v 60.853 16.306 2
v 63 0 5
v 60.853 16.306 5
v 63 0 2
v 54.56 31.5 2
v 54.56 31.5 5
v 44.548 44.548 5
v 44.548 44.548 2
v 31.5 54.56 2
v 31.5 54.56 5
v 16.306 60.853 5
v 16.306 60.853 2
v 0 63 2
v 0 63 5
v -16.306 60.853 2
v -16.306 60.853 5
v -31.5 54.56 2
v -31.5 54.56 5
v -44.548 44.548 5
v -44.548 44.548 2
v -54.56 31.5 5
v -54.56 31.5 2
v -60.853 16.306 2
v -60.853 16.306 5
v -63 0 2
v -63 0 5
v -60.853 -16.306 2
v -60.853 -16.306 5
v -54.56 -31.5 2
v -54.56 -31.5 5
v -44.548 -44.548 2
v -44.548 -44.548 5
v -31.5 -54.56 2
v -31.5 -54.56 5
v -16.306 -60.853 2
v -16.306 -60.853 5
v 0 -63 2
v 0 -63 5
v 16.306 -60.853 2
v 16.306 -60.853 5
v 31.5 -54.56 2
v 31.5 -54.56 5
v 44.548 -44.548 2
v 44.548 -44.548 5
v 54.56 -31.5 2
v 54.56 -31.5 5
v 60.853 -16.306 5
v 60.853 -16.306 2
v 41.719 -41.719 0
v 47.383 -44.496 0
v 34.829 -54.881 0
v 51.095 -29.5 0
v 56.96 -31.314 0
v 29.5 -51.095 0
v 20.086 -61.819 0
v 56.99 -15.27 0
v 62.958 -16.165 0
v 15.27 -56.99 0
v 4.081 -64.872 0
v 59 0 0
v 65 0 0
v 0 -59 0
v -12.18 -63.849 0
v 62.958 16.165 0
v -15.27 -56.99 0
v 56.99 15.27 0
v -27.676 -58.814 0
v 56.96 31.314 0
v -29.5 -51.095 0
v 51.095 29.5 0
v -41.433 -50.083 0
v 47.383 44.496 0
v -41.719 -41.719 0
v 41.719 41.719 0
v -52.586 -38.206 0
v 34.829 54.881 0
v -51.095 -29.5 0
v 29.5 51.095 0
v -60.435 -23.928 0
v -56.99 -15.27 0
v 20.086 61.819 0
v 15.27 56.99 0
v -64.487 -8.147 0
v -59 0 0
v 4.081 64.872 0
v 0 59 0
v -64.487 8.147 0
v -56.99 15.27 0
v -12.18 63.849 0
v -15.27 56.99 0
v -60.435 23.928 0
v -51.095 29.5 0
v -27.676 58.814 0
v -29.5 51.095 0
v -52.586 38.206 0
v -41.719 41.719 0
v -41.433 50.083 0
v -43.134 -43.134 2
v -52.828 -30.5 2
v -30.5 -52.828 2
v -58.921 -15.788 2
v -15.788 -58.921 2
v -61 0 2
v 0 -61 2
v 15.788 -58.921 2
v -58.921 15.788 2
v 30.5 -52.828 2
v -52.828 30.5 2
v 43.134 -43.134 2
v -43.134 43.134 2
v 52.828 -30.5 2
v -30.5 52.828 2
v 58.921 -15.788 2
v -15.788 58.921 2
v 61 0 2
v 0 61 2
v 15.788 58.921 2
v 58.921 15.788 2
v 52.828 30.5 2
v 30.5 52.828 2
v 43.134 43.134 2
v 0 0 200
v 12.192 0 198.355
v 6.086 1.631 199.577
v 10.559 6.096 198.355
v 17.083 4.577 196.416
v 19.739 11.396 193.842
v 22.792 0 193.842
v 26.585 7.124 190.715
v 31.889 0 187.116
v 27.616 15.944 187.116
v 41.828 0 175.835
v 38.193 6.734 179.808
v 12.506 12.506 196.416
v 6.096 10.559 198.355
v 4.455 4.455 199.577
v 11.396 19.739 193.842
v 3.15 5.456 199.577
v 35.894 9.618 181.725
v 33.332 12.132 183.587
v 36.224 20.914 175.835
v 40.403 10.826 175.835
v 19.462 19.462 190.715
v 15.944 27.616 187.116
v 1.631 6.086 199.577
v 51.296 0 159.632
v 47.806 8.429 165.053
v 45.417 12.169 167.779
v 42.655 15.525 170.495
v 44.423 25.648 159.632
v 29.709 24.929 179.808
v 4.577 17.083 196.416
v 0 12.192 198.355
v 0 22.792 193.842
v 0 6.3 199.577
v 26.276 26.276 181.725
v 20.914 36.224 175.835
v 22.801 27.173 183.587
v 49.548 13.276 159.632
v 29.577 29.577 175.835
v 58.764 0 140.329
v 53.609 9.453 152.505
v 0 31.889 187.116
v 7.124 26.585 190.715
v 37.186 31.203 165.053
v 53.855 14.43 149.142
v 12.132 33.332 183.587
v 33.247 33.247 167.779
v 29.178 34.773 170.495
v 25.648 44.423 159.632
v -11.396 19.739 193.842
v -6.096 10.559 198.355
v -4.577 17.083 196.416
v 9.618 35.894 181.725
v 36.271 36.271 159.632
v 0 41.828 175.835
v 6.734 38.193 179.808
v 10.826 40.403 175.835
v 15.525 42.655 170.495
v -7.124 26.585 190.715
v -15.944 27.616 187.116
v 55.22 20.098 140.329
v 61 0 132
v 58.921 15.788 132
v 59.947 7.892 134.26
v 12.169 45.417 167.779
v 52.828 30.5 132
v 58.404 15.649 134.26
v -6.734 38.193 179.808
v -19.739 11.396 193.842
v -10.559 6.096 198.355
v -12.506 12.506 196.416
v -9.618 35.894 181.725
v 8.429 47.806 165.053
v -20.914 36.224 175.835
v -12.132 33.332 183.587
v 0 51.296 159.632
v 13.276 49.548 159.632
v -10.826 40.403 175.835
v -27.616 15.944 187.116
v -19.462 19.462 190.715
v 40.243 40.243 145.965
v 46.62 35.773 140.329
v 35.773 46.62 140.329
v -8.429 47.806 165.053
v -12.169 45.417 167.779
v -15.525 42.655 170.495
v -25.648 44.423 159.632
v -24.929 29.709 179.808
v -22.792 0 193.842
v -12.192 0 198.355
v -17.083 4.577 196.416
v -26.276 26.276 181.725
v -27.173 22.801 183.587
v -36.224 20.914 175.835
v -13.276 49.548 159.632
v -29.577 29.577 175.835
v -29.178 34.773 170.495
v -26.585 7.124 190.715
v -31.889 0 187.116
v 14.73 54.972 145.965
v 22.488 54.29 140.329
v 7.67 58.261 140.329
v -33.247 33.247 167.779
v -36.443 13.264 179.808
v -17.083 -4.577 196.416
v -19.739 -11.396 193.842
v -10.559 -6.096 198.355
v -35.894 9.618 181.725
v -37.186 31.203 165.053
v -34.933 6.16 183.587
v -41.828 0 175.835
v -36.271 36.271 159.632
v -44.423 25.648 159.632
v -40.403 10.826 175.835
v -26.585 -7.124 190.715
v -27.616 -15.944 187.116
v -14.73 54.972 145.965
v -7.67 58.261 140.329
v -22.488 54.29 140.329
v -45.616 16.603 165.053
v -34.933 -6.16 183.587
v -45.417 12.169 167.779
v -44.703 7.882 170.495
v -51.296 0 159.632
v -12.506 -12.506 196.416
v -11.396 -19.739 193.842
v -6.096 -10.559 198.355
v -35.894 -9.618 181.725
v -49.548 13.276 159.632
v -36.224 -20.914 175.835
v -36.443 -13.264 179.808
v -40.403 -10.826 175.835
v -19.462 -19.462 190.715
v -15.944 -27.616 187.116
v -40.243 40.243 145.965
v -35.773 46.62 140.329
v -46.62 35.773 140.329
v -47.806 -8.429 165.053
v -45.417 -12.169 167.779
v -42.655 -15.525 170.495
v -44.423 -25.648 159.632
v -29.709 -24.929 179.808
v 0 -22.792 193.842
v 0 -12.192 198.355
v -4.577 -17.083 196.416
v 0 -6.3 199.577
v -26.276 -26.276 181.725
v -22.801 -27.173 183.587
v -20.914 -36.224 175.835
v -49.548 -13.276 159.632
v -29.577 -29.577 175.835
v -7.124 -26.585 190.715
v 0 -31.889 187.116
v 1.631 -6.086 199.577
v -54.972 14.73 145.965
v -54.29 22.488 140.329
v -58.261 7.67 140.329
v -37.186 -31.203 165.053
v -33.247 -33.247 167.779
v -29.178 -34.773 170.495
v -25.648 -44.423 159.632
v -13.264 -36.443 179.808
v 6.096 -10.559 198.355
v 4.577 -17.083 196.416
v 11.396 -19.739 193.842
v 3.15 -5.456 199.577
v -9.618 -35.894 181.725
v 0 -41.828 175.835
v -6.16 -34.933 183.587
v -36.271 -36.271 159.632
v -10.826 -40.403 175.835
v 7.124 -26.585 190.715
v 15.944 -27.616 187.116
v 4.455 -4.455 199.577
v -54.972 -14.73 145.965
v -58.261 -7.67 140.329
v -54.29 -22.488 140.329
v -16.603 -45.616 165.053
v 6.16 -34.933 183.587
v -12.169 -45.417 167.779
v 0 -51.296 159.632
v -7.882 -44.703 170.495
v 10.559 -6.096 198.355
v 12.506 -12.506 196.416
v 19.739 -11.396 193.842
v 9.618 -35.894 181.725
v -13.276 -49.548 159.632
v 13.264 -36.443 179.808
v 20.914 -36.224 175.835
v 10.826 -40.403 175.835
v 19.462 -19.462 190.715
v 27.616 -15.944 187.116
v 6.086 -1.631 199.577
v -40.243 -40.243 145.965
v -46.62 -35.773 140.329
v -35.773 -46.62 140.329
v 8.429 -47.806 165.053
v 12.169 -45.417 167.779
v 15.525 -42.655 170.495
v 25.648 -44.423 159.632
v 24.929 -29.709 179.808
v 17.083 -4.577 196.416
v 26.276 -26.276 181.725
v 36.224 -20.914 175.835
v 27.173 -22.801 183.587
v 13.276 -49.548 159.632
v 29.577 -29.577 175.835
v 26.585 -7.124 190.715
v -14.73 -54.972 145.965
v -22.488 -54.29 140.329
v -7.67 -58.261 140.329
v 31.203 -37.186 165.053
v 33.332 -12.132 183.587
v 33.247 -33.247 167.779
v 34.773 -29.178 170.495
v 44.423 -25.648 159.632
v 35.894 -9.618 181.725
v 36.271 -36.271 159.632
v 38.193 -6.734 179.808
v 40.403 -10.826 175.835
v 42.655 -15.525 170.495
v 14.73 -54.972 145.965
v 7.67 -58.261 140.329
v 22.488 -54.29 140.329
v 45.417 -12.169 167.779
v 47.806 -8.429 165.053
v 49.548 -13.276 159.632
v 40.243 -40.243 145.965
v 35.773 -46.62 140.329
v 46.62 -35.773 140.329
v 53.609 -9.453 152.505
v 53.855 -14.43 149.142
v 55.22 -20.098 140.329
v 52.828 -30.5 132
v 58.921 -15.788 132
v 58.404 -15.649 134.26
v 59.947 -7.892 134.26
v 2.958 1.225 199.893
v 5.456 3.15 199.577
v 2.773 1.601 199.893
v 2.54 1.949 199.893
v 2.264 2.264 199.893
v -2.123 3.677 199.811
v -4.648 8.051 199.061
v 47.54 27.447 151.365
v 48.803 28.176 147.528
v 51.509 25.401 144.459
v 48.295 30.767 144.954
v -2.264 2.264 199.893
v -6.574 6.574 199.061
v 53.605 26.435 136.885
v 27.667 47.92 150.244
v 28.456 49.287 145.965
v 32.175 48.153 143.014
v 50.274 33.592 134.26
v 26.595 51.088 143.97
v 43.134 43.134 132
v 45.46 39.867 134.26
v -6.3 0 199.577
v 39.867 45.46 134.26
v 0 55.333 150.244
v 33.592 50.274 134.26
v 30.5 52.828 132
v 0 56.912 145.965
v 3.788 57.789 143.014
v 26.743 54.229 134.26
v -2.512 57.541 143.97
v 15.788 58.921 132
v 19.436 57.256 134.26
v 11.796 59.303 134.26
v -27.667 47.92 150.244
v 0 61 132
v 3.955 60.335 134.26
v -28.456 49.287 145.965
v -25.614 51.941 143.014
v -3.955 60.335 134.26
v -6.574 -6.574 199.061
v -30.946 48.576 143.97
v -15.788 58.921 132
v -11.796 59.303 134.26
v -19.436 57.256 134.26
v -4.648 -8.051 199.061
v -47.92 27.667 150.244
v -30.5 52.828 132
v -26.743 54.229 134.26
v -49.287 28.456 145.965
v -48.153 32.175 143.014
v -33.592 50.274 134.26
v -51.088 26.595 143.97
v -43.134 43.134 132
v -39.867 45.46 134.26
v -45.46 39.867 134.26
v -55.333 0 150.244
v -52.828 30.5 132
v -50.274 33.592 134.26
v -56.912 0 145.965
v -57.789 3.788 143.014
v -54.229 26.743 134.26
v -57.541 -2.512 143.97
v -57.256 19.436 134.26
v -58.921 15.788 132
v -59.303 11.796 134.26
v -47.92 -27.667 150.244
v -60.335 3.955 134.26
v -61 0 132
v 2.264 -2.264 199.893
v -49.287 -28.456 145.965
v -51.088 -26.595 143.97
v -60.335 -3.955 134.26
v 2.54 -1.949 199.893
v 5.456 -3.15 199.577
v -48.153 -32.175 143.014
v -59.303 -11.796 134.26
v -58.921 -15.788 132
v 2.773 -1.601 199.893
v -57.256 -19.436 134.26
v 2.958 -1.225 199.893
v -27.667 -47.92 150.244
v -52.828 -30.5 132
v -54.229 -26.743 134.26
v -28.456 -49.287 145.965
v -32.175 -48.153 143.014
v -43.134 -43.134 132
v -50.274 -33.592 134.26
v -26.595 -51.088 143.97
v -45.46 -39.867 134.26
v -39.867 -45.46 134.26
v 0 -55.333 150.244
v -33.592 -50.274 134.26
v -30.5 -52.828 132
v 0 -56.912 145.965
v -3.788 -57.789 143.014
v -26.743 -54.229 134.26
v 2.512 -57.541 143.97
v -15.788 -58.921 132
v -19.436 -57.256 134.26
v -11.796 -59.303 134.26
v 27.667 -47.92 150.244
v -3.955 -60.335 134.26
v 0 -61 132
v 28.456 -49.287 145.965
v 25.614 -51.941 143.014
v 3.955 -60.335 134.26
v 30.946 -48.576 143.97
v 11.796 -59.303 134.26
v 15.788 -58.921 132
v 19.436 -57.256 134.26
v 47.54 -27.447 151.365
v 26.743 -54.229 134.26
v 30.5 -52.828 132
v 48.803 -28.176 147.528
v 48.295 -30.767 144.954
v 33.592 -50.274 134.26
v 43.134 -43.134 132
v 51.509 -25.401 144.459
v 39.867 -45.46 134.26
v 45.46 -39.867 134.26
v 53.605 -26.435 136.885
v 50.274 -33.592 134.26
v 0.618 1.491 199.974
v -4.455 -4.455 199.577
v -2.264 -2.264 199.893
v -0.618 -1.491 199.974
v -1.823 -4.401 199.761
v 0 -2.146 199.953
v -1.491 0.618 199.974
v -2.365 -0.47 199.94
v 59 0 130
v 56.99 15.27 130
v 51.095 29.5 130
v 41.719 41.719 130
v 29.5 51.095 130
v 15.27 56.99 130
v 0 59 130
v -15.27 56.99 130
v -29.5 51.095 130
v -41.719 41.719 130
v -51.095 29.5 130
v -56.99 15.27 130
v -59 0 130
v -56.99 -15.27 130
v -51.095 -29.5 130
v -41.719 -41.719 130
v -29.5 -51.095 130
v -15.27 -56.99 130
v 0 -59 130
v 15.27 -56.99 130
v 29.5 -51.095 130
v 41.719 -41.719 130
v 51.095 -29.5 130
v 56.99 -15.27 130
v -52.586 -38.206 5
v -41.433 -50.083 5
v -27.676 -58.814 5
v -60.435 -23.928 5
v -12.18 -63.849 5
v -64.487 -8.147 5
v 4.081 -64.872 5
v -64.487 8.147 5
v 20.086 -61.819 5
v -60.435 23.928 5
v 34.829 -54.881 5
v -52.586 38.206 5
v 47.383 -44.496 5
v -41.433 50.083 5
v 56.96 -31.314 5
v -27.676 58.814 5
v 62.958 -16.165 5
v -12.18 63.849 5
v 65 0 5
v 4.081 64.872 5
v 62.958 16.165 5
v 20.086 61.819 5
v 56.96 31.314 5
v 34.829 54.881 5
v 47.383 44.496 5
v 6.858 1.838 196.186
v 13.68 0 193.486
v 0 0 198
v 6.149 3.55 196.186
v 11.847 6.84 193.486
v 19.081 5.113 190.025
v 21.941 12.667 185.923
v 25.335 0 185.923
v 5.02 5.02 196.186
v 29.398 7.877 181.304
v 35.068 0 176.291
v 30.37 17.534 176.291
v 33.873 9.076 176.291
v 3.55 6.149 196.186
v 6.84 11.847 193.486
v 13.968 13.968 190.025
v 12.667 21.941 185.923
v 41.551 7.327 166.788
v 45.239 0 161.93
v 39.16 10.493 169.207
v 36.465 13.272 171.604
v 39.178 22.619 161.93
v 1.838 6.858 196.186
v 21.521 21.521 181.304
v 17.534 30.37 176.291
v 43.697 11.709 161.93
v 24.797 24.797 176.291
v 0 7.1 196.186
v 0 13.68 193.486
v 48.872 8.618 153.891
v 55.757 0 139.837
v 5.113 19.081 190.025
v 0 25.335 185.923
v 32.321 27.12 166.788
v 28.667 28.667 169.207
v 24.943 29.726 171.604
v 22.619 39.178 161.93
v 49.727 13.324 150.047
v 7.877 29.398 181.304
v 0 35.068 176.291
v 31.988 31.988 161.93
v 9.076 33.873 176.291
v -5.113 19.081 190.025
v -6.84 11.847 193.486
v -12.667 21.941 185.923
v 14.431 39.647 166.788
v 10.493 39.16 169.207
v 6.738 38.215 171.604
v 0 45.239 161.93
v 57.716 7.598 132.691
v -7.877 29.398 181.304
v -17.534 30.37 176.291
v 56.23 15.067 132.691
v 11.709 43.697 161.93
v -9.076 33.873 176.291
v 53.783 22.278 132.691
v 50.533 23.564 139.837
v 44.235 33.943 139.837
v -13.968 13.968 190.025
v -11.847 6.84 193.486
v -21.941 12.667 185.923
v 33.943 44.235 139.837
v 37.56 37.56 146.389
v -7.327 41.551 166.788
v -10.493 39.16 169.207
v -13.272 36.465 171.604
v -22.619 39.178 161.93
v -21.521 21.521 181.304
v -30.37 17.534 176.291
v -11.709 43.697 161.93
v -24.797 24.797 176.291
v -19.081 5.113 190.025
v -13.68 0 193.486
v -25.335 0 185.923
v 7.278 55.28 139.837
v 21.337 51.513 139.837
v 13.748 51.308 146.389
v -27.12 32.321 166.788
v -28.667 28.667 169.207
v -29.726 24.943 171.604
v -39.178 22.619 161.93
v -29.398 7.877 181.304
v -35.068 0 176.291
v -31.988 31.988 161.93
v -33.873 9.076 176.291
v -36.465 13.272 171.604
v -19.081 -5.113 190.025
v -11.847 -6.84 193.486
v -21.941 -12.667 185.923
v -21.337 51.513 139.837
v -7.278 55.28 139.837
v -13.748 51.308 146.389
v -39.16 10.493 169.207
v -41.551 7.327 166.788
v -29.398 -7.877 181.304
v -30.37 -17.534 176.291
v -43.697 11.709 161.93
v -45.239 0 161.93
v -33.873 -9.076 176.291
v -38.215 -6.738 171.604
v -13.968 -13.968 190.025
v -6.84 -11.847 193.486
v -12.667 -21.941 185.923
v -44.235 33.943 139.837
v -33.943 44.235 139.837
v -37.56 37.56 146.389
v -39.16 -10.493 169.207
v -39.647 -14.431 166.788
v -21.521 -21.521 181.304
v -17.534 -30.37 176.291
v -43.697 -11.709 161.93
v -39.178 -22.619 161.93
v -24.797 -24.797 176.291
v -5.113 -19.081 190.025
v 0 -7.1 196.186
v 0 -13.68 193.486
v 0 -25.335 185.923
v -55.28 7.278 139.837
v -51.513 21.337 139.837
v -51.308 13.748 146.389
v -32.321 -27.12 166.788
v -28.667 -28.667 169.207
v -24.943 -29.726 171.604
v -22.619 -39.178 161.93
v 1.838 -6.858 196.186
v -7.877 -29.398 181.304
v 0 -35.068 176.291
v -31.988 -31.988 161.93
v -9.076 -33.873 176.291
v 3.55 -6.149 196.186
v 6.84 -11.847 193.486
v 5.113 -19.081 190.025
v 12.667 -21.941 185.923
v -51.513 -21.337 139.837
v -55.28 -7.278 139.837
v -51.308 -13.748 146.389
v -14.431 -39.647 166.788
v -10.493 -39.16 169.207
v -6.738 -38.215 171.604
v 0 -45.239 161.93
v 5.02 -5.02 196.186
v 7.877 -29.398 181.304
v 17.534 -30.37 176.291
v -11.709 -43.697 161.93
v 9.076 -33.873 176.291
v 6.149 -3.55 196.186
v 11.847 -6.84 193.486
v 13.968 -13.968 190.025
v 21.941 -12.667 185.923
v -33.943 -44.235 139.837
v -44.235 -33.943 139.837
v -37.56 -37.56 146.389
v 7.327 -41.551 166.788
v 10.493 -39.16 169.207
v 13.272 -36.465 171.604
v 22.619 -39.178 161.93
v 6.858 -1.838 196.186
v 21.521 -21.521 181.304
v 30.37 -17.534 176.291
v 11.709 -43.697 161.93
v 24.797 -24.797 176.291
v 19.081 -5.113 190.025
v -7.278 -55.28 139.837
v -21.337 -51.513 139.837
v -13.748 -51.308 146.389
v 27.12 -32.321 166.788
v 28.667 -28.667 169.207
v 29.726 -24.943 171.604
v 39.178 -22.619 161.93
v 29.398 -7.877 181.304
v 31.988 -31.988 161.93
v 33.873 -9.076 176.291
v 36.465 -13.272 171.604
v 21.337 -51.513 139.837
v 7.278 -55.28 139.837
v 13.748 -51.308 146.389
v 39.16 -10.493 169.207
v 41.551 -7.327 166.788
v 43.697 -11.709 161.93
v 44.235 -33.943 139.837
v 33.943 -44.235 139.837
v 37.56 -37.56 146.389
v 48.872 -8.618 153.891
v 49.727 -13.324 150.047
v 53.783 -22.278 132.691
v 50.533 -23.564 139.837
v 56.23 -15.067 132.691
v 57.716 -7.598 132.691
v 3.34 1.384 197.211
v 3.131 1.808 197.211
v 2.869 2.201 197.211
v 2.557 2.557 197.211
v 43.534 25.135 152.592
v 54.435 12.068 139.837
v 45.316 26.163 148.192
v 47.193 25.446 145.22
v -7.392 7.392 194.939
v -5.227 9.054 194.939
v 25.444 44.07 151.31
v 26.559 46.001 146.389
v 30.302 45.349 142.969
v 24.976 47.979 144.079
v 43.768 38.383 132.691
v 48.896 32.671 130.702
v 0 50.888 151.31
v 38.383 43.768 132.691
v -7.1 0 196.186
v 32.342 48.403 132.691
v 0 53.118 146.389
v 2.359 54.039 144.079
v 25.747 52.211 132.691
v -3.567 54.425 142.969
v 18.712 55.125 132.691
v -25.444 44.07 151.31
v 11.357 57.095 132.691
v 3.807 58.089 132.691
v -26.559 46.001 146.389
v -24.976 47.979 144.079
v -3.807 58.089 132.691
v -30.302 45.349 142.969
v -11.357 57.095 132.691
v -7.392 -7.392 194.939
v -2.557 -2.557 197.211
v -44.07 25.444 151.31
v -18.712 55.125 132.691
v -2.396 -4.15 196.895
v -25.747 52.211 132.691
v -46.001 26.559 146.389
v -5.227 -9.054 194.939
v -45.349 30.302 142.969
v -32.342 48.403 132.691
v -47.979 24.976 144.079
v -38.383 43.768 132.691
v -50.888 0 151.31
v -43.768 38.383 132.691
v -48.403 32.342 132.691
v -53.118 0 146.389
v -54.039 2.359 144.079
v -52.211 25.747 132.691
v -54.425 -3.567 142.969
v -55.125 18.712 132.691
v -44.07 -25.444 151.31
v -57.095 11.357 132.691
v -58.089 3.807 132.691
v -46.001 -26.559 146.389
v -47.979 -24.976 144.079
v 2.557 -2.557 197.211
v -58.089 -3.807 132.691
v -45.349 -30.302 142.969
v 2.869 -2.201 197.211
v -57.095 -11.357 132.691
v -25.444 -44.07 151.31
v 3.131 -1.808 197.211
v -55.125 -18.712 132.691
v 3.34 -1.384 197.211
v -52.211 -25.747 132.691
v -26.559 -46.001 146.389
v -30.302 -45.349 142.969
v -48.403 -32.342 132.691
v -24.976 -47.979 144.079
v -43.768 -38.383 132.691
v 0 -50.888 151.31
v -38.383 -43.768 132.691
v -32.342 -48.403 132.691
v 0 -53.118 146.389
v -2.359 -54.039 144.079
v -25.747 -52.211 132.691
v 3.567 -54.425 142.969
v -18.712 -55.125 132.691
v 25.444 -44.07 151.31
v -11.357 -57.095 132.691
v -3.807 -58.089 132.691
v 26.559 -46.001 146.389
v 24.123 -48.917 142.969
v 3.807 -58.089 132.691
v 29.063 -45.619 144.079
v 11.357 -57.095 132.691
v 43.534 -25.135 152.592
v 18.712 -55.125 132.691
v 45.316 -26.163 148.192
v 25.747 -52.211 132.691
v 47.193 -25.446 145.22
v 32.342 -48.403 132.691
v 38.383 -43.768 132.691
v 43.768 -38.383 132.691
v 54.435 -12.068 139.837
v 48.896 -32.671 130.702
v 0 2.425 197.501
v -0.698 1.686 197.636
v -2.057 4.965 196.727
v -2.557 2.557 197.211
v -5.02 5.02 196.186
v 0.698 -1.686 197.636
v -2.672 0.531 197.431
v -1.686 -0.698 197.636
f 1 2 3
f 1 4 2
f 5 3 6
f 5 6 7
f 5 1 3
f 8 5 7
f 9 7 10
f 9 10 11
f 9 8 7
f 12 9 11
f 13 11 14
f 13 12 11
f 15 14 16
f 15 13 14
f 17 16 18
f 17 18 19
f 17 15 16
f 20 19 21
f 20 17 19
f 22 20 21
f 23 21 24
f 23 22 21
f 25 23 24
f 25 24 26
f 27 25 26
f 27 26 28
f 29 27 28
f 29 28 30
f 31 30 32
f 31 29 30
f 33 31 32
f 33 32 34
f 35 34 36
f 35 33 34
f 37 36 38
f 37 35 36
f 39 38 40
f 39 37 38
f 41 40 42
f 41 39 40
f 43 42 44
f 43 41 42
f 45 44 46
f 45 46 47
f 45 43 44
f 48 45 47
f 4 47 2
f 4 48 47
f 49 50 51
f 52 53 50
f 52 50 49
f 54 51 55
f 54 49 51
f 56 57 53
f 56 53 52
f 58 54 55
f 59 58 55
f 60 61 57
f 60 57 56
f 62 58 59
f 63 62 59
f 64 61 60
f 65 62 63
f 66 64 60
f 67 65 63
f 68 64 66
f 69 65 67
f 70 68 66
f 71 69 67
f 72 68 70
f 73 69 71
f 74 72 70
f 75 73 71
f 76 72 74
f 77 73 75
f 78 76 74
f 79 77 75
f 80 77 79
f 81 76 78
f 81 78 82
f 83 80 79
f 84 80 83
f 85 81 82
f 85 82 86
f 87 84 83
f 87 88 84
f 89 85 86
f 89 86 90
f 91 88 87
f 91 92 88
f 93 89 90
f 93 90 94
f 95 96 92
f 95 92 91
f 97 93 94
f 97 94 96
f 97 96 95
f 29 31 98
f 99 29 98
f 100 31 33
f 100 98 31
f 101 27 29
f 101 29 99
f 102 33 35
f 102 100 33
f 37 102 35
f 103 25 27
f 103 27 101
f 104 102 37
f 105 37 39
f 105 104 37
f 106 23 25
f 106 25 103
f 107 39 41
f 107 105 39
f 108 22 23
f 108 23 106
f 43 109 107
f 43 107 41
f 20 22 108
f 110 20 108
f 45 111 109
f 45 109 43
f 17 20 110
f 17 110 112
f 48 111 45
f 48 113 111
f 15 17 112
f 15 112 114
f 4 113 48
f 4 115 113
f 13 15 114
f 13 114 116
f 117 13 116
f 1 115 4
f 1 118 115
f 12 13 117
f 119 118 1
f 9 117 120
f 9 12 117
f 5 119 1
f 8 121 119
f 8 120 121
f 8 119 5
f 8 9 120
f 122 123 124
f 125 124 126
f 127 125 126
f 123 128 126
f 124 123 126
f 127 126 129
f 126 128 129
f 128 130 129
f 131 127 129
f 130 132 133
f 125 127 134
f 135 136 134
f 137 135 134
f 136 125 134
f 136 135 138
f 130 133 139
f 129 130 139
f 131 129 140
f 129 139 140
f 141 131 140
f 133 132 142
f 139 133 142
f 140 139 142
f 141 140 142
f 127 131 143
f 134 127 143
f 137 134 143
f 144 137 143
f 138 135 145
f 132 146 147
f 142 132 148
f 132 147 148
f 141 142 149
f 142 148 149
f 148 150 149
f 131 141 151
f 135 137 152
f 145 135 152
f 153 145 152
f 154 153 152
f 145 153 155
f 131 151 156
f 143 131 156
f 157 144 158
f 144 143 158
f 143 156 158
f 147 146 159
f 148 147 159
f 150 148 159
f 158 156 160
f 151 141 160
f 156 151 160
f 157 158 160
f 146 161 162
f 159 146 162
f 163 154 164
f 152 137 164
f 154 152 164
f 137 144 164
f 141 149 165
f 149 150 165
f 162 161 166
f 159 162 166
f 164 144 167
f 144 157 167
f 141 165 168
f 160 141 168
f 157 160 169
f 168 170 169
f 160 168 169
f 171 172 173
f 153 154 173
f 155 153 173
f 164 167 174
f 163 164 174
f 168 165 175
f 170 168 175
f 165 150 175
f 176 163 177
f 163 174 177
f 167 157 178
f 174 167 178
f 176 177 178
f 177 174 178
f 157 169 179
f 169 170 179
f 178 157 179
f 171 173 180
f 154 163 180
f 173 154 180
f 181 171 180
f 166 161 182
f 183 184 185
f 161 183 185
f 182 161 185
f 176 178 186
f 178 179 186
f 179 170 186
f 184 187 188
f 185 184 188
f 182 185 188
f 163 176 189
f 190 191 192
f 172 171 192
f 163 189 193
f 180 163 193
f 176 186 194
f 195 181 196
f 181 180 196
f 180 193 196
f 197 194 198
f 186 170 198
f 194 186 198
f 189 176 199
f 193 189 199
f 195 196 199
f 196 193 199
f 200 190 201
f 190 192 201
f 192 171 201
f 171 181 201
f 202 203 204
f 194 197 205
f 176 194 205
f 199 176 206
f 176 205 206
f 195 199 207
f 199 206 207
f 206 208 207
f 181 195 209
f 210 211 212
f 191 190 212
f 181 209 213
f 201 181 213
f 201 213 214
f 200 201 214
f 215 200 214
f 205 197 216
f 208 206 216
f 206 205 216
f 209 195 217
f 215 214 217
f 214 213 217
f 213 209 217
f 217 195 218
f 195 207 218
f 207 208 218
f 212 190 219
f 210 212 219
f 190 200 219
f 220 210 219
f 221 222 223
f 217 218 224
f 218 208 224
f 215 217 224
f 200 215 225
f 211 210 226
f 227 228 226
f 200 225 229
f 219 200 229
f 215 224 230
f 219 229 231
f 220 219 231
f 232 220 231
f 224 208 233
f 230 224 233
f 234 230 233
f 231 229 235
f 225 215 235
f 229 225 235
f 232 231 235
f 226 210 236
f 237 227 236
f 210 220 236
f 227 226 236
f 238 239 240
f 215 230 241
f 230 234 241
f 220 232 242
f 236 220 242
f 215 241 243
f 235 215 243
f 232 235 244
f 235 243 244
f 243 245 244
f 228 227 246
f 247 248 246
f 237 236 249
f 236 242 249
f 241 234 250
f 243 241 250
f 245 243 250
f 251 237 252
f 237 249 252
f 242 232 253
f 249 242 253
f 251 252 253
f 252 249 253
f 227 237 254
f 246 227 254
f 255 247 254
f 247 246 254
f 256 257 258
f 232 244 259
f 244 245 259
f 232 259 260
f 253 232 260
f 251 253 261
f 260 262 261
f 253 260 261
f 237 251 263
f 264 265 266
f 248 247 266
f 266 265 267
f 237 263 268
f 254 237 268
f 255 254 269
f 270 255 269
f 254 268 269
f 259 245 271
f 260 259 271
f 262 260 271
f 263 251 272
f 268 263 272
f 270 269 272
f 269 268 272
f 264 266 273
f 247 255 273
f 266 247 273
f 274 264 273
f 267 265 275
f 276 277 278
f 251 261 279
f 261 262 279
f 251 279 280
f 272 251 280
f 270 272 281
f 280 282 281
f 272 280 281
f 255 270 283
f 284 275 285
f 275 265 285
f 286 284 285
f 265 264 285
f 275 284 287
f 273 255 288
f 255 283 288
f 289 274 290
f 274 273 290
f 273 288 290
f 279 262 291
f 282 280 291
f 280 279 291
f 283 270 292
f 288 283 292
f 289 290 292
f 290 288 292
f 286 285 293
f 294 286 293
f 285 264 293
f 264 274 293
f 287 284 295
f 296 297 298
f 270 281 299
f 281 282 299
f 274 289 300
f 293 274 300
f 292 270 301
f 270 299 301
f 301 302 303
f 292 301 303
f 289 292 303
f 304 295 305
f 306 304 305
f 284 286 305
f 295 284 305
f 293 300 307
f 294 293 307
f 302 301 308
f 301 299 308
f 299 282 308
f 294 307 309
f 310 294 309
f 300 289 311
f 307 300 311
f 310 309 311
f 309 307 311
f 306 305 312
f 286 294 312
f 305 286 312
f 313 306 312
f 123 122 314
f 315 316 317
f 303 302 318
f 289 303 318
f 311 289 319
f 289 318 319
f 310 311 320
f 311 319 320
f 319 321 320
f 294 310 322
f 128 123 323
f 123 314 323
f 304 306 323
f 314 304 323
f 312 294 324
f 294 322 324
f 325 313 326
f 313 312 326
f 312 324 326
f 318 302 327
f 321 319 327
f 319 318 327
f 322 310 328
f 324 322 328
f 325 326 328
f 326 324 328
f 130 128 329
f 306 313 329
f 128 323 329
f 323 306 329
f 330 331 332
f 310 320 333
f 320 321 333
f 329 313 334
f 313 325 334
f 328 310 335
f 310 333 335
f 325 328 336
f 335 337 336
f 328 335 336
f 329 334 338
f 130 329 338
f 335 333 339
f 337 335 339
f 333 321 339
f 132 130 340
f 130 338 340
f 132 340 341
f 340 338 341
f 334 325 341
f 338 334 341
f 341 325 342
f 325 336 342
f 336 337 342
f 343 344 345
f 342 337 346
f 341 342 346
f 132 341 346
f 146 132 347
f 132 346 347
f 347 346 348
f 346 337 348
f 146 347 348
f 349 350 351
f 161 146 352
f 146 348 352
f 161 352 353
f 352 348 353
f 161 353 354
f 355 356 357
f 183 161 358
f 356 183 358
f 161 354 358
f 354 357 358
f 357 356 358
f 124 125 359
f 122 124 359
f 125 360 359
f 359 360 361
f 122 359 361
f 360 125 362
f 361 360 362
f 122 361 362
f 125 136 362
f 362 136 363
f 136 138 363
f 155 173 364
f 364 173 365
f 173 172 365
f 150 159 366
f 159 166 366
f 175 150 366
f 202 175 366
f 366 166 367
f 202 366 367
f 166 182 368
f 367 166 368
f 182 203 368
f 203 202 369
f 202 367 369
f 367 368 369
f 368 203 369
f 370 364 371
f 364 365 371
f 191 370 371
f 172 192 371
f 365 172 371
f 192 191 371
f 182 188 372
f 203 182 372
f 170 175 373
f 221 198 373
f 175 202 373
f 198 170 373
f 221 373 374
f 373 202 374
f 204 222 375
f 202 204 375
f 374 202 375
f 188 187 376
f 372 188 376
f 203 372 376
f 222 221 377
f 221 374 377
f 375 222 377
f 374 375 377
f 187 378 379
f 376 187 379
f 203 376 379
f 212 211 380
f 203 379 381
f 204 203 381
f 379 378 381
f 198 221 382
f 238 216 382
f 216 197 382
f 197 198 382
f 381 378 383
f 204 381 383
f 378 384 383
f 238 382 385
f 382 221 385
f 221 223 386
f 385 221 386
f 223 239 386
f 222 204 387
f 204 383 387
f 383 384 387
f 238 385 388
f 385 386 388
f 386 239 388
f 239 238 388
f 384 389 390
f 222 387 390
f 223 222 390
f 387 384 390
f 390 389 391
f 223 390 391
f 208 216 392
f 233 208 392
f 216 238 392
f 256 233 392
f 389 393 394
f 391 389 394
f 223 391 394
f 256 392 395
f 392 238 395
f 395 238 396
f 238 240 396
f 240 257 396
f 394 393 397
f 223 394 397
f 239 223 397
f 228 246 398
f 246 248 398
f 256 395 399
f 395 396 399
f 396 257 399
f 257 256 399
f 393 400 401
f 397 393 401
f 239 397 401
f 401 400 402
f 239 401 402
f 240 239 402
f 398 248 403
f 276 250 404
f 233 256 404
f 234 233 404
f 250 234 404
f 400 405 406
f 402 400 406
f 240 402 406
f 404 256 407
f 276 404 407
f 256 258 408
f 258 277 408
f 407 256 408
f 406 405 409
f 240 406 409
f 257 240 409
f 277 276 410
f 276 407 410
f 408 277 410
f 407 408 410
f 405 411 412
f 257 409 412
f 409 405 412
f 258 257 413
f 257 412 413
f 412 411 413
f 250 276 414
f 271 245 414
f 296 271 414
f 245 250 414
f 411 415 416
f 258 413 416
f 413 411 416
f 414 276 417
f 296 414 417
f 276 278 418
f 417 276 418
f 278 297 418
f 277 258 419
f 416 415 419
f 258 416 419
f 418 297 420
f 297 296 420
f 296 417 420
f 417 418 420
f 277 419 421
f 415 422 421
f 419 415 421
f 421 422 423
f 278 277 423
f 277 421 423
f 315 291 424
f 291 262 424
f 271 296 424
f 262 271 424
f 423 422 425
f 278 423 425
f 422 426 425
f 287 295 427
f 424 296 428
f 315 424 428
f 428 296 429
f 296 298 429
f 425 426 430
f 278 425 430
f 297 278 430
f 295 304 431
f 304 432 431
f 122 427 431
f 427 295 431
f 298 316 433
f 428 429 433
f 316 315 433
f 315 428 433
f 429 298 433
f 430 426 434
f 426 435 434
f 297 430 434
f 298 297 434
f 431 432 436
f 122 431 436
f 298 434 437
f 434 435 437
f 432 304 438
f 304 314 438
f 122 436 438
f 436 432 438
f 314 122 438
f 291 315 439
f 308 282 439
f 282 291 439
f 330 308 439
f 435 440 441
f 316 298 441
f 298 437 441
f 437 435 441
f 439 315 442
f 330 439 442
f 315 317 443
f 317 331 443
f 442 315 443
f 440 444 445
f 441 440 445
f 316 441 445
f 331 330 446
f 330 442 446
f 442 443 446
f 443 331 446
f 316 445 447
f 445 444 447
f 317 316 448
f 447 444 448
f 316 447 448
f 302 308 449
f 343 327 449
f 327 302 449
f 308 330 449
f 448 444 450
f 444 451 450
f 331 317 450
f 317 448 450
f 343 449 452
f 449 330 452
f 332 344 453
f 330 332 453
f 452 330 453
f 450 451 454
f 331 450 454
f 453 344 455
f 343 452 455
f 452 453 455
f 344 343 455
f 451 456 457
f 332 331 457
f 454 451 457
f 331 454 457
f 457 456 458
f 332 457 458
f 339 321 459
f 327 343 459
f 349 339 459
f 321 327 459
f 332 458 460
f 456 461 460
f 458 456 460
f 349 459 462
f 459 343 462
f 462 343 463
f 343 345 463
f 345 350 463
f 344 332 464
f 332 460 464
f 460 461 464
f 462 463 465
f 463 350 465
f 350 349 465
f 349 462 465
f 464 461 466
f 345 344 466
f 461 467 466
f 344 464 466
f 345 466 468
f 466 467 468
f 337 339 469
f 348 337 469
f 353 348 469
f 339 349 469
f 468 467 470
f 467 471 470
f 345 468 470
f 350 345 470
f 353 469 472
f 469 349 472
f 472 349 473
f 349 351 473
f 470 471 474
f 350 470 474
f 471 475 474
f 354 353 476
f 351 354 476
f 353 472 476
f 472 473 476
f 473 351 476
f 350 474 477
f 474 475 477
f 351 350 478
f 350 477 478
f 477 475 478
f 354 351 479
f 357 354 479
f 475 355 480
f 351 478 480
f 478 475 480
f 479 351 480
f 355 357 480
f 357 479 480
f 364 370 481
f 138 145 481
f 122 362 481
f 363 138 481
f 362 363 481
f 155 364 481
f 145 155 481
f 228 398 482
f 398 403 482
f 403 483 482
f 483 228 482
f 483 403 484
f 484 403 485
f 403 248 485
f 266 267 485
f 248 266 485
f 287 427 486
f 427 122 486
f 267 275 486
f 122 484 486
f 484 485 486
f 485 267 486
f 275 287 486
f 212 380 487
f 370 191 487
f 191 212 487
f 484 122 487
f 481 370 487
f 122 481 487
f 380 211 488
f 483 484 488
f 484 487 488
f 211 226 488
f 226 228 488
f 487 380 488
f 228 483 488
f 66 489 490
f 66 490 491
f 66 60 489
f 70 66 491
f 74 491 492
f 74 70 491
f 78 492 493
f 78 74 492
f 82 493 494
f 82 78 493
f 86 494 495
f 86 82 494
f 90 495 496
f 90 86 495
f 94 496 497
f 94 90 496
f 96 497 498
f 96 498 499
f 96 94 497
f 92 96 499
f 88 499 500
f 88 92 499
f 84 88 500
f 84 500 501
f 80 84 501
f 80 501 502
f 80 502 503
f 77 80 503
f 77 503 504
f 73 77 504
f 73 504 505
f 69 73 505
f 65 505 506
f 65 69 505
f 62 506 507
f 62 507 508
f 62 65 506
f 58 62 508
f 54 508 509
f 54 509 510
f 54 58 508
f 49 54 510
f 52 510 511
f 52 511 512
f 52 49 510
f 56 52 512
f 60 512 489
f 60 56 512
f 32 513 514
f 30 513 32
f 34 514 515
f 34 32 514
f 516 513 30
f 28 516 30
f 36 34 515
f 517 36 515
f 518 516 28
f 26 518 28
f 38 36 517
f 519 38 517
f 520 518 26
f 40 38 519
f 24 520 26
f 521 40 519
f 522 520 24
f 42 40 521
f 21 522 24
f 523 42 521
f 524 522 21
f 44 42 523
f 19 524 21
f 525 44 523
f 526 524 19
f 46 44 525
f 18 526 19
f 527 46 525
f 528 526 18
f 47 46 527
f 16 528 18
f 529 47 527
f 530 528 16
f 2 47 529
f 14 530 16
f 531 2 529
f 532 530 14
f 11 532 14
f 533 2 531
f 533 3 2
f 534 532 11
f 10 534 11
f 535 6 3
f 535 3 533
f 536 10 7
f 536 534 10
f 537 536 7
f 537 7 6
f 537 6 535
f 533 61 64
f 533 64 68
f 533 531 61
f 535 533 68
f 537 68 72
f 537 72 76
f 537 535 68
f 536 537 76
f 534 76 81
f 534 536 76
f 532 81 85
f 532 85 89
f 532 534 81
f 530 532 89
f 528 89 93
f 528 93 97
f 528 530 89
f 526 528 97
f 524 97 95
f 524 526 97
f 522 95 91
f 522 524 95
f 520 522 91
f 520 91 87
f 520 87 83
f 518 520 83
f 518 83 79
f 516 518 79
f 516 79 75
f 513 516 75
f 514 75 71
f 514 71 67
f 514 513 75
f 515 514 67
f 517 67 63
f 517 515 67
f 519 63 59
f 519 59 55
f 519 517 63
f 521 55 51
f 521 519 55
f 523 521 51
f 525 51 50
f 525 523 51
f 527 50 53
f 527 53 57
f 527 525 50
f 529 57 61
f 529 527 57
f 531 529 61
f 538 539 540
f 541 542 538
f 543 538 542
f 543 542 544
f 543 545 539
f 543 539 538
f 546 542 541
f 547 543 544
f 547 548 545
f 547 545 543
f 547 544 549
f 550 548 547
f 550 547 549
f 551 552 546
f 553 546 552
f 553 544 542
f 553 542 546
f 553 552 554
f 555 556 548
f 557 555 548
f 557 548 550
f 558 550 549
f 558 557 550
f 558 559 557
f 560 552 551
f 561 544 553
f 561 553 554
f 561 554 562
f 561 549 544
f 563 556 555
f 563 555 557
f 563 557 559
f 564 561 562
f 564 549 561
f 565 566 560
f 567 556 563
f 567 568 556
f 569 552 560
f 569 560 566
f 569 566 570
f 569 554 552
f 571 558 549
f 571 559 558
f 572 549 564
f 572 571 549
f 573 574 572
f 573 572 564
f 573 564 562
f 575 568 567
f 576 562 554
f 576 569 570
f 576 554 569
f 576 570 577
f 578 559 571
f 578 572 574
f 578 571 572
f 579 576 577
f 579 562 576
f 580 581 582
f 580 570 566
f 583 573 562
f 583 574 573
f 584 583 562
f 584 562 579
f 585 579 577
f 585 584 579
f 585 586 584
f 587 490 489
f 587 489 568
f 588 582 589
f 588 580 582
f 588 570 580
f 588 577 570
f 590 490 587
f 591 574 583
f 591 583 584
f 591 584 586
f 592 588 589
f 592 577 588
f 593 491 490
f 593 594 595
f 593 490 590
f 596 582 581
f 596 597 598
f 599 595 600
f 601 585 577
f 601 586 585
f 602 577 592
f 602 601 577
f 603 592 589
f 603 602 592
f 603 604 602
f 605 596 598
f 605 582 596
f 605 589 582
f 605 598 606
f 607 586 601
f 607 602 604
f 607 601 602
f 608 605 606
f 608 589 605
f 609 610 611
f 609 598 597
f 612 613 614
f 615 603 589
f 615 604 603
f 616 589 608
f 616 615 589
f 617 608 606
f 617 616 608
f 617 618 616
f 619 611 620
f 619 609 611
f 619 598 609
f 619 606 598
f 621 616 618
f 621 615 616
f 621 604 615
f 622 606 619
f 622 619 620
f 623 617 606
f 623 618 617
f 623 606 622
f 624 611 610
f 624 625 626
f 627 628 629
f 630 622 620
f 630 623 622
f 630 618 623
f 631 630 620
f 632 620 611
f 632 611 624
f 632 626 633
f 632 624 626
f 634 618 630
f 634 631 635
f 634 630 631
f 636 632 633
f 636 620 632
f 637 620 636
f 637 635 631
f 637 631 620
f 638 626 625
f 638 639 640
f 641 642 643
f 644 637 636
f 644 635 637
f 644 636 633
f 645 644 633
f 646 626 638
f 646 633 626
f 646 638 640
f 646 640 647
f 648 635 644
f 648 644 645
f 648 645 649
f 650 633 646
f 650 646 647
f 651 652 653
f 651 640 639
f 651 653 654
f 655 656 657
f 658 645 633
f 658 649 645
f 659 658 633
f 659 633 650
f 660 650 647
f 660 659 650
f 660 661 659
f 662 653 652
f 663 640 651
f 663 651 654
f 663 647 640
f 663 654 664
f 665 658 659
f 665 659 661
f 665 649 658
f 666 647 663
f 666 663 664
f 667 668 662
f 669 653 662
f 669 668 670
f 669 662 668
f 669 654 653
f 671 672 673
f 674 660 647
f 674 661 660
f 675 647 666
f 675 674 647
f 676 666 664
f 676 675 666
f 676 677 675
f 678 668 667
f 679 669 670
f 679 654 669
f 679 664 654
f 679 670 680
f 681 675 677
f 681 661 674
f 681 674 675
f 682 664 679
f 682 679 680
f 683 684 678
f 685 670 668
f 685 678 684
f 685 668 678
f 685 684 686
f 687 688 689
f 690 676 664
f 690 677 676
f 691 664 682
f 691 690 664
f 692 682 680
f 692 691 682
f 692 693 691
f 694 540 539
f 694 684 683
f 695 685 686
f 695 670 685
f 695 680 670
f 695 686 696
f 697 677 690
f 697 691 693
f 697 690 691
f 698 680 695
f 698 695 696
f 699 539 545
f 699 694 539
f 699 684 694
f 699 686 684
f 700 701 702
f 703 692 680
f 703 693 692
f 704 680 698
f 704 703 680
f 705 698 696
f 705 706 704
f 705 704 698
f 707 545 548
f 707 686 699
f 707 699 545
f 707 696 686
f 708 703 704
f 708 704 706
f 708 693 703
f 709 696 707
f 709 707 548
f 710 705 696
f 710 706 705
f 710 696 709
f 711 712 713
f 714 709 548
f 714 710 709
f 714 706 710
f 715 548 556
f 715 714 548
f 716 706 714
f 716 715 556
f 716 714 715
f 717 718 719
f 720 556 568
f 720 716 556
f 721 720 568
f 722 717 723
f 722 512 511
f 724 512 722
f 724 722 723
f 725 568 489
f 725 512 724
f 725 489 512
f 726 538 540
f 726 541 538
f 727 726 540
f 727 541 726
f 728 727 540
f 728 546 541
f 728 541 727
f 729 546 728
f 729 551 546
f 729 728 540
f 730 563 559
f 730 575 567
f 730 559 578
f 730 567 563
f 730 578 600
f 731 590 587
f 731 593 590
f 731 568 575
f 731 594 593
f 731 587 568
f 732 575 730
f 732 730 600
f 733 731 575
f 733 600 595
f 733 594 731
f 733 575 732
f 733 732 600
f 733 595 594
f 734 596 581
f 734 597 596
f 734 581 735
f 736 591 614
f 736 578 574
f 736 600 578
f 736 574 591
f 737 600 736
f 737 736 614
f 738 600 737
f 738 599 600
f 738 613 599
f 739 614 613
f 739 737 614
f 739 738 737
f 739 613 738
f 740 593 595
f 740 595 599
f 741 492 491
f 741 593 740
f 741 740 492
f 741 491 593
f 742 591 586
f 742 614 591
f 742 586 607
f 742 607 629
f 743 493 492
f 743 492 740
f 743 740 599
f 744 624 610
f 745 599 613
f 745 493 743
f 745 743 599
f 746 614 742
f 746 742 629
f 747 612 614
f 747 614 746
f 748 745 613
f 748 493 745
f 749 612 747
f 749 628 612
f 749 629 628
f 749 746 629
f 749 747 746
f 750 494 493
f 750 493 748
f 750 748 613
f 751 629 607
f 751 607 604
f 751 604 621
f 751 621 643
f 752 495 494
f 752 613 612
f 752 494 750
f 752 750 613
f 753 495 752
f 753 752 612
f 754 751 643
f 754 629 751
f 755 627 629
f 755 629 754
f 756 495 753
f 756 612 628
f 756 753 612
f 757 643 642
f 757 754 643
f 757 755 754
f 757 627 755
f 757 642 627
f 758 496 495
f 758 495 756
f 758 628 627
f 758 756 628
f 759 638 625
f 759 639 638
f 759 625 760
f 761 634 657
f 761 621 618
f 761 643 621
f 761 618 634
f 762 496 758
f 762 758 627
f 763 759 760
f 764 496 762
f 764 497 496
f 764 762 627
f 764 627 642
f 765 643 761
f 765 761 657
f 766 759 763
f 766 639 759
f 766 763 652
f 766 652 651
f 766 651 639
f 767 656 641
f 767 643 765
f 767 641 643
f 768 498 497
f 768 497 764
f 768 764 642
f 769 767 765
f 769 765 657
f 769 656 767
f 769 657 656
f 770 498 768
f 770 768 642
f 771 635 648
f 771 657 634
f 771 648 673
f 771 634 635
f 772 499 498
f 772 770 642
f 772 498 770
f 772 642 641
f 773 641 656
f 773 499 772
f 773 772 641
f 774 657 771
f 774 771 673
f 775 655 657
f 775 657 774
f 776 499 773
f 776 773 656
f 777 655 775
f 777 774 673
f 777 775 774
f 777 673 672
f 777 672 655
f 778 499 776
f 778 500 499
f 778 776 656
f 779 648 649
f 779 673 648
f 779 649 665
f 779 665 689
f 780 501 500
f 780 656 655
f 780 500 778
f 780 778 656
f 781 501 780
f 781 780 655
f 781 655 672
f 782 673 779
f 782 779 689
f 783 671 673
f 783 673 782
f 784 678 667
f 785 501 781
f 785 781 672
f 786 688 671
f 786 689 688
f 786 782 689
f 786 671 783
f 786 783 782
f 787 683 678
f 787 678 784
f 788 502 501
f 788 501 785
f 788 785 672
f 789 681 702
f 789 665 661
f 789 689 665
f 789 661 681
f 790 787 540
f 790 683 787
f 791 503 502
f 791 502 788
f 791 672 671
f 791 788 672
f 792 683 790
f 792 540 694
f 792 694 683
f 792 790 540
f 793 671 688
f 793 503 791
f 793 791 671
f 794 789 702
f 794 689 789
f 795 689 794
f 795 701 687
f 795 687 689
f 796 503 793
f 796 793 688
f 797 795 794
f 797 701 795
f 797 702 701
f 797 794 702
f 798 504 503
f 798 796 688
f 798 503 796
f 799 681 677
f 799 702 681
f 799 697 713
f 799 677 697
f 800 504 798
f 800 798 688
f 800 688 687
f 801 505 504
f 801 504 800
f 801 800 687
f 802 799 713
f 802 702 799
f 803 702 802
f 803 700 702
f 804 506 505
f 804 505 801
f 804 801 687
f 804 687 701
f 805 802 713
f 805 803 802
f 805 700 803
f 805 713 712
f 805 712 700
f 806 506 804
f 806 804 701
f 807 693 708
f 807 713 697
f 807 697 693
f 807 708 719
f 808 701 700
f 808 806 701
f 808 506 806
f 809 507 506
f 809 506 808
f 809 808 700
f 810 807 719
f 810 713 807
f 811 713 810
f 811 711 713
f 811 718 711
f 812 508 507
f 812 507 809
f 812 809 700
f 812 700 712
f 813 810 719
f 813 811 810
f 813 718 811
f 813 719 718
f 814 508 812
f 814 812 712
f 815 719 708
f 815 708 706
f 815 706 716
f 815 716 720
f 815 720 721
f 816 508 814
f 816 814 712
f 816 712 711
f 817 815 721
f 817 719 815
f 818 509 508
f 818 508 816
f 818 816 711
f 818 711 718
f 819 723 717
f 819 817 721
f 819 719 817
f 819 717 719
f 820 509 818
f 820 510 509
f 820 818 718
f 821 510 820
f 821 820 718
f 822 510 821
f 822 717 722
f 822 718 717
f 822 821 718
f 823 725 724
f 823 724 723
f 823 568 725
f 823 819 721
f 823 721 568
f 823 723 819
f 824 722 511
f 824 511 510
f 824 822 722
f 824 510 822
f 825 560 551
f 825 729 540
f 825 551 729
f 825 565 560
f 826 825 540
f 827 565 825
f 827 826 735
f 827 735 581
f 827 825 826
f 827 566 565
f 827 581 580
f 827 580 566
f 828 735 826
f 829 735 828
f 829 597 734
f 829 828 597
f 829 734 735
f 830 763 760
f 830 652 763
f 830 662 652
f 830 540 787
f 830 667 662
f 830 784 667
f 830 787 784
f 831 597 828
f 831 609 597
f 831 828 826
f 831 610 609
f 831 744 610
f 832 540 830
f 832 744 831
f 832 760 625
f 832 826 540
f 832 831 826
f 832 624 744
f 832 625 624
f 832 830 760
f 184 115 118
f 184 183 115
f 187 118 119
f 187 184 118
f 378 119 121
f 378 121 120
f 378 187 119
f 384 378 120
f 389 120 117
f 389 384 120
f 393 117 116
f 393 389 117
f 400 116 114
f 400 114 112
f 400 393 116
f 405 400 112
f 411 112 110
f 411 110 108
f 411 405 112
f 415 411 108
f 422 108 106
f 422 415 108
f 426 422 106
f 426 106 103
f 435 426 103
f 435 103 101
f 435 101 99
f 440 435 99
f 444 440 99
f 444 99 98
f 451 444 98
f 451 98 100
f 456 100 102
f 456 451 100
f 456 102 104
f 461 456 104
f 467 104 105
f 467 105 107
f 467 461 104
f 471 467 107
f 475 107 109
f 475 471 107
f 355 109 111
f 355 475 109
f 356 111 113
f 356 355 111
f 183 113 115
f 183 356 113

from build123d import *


with BuildPart() as part:
    # Sketch001 → Revolution (revolve)
    with BuildSketch(Plane.XZ):
        with BuildLine():
            Line((65, 0), (65, 5))
            Line((65, 5), (63, 5))
            Line((63, 5), (63, 2))
            Line((63, 2), (61, 2))
            Line((61, 2), (61, 132))
            add(Edge.make_bspline(
                [(0, 200), (46.719524, 200.024536), (61, 132), (61, 132)],
                knots=[0, 0, 0, 0, 1, 1, 1, 1], degree=3))
            Line((0, 200), (0, 198))
            add(Edge.make_bspline(
                [(0, 198), (43.327412, 190.171173), (59, 130), (59, 130)],
                knots=[0, 0, 0, 0, 1, 1, 1, 1], degree=3))
            Line((59, 130), (59, 0))
            Line((59, 0), (65, 0))
        make_face()
    revolve(axis=Axis((0, 0, 0), (0, 0, 1)))


solid = part.part
